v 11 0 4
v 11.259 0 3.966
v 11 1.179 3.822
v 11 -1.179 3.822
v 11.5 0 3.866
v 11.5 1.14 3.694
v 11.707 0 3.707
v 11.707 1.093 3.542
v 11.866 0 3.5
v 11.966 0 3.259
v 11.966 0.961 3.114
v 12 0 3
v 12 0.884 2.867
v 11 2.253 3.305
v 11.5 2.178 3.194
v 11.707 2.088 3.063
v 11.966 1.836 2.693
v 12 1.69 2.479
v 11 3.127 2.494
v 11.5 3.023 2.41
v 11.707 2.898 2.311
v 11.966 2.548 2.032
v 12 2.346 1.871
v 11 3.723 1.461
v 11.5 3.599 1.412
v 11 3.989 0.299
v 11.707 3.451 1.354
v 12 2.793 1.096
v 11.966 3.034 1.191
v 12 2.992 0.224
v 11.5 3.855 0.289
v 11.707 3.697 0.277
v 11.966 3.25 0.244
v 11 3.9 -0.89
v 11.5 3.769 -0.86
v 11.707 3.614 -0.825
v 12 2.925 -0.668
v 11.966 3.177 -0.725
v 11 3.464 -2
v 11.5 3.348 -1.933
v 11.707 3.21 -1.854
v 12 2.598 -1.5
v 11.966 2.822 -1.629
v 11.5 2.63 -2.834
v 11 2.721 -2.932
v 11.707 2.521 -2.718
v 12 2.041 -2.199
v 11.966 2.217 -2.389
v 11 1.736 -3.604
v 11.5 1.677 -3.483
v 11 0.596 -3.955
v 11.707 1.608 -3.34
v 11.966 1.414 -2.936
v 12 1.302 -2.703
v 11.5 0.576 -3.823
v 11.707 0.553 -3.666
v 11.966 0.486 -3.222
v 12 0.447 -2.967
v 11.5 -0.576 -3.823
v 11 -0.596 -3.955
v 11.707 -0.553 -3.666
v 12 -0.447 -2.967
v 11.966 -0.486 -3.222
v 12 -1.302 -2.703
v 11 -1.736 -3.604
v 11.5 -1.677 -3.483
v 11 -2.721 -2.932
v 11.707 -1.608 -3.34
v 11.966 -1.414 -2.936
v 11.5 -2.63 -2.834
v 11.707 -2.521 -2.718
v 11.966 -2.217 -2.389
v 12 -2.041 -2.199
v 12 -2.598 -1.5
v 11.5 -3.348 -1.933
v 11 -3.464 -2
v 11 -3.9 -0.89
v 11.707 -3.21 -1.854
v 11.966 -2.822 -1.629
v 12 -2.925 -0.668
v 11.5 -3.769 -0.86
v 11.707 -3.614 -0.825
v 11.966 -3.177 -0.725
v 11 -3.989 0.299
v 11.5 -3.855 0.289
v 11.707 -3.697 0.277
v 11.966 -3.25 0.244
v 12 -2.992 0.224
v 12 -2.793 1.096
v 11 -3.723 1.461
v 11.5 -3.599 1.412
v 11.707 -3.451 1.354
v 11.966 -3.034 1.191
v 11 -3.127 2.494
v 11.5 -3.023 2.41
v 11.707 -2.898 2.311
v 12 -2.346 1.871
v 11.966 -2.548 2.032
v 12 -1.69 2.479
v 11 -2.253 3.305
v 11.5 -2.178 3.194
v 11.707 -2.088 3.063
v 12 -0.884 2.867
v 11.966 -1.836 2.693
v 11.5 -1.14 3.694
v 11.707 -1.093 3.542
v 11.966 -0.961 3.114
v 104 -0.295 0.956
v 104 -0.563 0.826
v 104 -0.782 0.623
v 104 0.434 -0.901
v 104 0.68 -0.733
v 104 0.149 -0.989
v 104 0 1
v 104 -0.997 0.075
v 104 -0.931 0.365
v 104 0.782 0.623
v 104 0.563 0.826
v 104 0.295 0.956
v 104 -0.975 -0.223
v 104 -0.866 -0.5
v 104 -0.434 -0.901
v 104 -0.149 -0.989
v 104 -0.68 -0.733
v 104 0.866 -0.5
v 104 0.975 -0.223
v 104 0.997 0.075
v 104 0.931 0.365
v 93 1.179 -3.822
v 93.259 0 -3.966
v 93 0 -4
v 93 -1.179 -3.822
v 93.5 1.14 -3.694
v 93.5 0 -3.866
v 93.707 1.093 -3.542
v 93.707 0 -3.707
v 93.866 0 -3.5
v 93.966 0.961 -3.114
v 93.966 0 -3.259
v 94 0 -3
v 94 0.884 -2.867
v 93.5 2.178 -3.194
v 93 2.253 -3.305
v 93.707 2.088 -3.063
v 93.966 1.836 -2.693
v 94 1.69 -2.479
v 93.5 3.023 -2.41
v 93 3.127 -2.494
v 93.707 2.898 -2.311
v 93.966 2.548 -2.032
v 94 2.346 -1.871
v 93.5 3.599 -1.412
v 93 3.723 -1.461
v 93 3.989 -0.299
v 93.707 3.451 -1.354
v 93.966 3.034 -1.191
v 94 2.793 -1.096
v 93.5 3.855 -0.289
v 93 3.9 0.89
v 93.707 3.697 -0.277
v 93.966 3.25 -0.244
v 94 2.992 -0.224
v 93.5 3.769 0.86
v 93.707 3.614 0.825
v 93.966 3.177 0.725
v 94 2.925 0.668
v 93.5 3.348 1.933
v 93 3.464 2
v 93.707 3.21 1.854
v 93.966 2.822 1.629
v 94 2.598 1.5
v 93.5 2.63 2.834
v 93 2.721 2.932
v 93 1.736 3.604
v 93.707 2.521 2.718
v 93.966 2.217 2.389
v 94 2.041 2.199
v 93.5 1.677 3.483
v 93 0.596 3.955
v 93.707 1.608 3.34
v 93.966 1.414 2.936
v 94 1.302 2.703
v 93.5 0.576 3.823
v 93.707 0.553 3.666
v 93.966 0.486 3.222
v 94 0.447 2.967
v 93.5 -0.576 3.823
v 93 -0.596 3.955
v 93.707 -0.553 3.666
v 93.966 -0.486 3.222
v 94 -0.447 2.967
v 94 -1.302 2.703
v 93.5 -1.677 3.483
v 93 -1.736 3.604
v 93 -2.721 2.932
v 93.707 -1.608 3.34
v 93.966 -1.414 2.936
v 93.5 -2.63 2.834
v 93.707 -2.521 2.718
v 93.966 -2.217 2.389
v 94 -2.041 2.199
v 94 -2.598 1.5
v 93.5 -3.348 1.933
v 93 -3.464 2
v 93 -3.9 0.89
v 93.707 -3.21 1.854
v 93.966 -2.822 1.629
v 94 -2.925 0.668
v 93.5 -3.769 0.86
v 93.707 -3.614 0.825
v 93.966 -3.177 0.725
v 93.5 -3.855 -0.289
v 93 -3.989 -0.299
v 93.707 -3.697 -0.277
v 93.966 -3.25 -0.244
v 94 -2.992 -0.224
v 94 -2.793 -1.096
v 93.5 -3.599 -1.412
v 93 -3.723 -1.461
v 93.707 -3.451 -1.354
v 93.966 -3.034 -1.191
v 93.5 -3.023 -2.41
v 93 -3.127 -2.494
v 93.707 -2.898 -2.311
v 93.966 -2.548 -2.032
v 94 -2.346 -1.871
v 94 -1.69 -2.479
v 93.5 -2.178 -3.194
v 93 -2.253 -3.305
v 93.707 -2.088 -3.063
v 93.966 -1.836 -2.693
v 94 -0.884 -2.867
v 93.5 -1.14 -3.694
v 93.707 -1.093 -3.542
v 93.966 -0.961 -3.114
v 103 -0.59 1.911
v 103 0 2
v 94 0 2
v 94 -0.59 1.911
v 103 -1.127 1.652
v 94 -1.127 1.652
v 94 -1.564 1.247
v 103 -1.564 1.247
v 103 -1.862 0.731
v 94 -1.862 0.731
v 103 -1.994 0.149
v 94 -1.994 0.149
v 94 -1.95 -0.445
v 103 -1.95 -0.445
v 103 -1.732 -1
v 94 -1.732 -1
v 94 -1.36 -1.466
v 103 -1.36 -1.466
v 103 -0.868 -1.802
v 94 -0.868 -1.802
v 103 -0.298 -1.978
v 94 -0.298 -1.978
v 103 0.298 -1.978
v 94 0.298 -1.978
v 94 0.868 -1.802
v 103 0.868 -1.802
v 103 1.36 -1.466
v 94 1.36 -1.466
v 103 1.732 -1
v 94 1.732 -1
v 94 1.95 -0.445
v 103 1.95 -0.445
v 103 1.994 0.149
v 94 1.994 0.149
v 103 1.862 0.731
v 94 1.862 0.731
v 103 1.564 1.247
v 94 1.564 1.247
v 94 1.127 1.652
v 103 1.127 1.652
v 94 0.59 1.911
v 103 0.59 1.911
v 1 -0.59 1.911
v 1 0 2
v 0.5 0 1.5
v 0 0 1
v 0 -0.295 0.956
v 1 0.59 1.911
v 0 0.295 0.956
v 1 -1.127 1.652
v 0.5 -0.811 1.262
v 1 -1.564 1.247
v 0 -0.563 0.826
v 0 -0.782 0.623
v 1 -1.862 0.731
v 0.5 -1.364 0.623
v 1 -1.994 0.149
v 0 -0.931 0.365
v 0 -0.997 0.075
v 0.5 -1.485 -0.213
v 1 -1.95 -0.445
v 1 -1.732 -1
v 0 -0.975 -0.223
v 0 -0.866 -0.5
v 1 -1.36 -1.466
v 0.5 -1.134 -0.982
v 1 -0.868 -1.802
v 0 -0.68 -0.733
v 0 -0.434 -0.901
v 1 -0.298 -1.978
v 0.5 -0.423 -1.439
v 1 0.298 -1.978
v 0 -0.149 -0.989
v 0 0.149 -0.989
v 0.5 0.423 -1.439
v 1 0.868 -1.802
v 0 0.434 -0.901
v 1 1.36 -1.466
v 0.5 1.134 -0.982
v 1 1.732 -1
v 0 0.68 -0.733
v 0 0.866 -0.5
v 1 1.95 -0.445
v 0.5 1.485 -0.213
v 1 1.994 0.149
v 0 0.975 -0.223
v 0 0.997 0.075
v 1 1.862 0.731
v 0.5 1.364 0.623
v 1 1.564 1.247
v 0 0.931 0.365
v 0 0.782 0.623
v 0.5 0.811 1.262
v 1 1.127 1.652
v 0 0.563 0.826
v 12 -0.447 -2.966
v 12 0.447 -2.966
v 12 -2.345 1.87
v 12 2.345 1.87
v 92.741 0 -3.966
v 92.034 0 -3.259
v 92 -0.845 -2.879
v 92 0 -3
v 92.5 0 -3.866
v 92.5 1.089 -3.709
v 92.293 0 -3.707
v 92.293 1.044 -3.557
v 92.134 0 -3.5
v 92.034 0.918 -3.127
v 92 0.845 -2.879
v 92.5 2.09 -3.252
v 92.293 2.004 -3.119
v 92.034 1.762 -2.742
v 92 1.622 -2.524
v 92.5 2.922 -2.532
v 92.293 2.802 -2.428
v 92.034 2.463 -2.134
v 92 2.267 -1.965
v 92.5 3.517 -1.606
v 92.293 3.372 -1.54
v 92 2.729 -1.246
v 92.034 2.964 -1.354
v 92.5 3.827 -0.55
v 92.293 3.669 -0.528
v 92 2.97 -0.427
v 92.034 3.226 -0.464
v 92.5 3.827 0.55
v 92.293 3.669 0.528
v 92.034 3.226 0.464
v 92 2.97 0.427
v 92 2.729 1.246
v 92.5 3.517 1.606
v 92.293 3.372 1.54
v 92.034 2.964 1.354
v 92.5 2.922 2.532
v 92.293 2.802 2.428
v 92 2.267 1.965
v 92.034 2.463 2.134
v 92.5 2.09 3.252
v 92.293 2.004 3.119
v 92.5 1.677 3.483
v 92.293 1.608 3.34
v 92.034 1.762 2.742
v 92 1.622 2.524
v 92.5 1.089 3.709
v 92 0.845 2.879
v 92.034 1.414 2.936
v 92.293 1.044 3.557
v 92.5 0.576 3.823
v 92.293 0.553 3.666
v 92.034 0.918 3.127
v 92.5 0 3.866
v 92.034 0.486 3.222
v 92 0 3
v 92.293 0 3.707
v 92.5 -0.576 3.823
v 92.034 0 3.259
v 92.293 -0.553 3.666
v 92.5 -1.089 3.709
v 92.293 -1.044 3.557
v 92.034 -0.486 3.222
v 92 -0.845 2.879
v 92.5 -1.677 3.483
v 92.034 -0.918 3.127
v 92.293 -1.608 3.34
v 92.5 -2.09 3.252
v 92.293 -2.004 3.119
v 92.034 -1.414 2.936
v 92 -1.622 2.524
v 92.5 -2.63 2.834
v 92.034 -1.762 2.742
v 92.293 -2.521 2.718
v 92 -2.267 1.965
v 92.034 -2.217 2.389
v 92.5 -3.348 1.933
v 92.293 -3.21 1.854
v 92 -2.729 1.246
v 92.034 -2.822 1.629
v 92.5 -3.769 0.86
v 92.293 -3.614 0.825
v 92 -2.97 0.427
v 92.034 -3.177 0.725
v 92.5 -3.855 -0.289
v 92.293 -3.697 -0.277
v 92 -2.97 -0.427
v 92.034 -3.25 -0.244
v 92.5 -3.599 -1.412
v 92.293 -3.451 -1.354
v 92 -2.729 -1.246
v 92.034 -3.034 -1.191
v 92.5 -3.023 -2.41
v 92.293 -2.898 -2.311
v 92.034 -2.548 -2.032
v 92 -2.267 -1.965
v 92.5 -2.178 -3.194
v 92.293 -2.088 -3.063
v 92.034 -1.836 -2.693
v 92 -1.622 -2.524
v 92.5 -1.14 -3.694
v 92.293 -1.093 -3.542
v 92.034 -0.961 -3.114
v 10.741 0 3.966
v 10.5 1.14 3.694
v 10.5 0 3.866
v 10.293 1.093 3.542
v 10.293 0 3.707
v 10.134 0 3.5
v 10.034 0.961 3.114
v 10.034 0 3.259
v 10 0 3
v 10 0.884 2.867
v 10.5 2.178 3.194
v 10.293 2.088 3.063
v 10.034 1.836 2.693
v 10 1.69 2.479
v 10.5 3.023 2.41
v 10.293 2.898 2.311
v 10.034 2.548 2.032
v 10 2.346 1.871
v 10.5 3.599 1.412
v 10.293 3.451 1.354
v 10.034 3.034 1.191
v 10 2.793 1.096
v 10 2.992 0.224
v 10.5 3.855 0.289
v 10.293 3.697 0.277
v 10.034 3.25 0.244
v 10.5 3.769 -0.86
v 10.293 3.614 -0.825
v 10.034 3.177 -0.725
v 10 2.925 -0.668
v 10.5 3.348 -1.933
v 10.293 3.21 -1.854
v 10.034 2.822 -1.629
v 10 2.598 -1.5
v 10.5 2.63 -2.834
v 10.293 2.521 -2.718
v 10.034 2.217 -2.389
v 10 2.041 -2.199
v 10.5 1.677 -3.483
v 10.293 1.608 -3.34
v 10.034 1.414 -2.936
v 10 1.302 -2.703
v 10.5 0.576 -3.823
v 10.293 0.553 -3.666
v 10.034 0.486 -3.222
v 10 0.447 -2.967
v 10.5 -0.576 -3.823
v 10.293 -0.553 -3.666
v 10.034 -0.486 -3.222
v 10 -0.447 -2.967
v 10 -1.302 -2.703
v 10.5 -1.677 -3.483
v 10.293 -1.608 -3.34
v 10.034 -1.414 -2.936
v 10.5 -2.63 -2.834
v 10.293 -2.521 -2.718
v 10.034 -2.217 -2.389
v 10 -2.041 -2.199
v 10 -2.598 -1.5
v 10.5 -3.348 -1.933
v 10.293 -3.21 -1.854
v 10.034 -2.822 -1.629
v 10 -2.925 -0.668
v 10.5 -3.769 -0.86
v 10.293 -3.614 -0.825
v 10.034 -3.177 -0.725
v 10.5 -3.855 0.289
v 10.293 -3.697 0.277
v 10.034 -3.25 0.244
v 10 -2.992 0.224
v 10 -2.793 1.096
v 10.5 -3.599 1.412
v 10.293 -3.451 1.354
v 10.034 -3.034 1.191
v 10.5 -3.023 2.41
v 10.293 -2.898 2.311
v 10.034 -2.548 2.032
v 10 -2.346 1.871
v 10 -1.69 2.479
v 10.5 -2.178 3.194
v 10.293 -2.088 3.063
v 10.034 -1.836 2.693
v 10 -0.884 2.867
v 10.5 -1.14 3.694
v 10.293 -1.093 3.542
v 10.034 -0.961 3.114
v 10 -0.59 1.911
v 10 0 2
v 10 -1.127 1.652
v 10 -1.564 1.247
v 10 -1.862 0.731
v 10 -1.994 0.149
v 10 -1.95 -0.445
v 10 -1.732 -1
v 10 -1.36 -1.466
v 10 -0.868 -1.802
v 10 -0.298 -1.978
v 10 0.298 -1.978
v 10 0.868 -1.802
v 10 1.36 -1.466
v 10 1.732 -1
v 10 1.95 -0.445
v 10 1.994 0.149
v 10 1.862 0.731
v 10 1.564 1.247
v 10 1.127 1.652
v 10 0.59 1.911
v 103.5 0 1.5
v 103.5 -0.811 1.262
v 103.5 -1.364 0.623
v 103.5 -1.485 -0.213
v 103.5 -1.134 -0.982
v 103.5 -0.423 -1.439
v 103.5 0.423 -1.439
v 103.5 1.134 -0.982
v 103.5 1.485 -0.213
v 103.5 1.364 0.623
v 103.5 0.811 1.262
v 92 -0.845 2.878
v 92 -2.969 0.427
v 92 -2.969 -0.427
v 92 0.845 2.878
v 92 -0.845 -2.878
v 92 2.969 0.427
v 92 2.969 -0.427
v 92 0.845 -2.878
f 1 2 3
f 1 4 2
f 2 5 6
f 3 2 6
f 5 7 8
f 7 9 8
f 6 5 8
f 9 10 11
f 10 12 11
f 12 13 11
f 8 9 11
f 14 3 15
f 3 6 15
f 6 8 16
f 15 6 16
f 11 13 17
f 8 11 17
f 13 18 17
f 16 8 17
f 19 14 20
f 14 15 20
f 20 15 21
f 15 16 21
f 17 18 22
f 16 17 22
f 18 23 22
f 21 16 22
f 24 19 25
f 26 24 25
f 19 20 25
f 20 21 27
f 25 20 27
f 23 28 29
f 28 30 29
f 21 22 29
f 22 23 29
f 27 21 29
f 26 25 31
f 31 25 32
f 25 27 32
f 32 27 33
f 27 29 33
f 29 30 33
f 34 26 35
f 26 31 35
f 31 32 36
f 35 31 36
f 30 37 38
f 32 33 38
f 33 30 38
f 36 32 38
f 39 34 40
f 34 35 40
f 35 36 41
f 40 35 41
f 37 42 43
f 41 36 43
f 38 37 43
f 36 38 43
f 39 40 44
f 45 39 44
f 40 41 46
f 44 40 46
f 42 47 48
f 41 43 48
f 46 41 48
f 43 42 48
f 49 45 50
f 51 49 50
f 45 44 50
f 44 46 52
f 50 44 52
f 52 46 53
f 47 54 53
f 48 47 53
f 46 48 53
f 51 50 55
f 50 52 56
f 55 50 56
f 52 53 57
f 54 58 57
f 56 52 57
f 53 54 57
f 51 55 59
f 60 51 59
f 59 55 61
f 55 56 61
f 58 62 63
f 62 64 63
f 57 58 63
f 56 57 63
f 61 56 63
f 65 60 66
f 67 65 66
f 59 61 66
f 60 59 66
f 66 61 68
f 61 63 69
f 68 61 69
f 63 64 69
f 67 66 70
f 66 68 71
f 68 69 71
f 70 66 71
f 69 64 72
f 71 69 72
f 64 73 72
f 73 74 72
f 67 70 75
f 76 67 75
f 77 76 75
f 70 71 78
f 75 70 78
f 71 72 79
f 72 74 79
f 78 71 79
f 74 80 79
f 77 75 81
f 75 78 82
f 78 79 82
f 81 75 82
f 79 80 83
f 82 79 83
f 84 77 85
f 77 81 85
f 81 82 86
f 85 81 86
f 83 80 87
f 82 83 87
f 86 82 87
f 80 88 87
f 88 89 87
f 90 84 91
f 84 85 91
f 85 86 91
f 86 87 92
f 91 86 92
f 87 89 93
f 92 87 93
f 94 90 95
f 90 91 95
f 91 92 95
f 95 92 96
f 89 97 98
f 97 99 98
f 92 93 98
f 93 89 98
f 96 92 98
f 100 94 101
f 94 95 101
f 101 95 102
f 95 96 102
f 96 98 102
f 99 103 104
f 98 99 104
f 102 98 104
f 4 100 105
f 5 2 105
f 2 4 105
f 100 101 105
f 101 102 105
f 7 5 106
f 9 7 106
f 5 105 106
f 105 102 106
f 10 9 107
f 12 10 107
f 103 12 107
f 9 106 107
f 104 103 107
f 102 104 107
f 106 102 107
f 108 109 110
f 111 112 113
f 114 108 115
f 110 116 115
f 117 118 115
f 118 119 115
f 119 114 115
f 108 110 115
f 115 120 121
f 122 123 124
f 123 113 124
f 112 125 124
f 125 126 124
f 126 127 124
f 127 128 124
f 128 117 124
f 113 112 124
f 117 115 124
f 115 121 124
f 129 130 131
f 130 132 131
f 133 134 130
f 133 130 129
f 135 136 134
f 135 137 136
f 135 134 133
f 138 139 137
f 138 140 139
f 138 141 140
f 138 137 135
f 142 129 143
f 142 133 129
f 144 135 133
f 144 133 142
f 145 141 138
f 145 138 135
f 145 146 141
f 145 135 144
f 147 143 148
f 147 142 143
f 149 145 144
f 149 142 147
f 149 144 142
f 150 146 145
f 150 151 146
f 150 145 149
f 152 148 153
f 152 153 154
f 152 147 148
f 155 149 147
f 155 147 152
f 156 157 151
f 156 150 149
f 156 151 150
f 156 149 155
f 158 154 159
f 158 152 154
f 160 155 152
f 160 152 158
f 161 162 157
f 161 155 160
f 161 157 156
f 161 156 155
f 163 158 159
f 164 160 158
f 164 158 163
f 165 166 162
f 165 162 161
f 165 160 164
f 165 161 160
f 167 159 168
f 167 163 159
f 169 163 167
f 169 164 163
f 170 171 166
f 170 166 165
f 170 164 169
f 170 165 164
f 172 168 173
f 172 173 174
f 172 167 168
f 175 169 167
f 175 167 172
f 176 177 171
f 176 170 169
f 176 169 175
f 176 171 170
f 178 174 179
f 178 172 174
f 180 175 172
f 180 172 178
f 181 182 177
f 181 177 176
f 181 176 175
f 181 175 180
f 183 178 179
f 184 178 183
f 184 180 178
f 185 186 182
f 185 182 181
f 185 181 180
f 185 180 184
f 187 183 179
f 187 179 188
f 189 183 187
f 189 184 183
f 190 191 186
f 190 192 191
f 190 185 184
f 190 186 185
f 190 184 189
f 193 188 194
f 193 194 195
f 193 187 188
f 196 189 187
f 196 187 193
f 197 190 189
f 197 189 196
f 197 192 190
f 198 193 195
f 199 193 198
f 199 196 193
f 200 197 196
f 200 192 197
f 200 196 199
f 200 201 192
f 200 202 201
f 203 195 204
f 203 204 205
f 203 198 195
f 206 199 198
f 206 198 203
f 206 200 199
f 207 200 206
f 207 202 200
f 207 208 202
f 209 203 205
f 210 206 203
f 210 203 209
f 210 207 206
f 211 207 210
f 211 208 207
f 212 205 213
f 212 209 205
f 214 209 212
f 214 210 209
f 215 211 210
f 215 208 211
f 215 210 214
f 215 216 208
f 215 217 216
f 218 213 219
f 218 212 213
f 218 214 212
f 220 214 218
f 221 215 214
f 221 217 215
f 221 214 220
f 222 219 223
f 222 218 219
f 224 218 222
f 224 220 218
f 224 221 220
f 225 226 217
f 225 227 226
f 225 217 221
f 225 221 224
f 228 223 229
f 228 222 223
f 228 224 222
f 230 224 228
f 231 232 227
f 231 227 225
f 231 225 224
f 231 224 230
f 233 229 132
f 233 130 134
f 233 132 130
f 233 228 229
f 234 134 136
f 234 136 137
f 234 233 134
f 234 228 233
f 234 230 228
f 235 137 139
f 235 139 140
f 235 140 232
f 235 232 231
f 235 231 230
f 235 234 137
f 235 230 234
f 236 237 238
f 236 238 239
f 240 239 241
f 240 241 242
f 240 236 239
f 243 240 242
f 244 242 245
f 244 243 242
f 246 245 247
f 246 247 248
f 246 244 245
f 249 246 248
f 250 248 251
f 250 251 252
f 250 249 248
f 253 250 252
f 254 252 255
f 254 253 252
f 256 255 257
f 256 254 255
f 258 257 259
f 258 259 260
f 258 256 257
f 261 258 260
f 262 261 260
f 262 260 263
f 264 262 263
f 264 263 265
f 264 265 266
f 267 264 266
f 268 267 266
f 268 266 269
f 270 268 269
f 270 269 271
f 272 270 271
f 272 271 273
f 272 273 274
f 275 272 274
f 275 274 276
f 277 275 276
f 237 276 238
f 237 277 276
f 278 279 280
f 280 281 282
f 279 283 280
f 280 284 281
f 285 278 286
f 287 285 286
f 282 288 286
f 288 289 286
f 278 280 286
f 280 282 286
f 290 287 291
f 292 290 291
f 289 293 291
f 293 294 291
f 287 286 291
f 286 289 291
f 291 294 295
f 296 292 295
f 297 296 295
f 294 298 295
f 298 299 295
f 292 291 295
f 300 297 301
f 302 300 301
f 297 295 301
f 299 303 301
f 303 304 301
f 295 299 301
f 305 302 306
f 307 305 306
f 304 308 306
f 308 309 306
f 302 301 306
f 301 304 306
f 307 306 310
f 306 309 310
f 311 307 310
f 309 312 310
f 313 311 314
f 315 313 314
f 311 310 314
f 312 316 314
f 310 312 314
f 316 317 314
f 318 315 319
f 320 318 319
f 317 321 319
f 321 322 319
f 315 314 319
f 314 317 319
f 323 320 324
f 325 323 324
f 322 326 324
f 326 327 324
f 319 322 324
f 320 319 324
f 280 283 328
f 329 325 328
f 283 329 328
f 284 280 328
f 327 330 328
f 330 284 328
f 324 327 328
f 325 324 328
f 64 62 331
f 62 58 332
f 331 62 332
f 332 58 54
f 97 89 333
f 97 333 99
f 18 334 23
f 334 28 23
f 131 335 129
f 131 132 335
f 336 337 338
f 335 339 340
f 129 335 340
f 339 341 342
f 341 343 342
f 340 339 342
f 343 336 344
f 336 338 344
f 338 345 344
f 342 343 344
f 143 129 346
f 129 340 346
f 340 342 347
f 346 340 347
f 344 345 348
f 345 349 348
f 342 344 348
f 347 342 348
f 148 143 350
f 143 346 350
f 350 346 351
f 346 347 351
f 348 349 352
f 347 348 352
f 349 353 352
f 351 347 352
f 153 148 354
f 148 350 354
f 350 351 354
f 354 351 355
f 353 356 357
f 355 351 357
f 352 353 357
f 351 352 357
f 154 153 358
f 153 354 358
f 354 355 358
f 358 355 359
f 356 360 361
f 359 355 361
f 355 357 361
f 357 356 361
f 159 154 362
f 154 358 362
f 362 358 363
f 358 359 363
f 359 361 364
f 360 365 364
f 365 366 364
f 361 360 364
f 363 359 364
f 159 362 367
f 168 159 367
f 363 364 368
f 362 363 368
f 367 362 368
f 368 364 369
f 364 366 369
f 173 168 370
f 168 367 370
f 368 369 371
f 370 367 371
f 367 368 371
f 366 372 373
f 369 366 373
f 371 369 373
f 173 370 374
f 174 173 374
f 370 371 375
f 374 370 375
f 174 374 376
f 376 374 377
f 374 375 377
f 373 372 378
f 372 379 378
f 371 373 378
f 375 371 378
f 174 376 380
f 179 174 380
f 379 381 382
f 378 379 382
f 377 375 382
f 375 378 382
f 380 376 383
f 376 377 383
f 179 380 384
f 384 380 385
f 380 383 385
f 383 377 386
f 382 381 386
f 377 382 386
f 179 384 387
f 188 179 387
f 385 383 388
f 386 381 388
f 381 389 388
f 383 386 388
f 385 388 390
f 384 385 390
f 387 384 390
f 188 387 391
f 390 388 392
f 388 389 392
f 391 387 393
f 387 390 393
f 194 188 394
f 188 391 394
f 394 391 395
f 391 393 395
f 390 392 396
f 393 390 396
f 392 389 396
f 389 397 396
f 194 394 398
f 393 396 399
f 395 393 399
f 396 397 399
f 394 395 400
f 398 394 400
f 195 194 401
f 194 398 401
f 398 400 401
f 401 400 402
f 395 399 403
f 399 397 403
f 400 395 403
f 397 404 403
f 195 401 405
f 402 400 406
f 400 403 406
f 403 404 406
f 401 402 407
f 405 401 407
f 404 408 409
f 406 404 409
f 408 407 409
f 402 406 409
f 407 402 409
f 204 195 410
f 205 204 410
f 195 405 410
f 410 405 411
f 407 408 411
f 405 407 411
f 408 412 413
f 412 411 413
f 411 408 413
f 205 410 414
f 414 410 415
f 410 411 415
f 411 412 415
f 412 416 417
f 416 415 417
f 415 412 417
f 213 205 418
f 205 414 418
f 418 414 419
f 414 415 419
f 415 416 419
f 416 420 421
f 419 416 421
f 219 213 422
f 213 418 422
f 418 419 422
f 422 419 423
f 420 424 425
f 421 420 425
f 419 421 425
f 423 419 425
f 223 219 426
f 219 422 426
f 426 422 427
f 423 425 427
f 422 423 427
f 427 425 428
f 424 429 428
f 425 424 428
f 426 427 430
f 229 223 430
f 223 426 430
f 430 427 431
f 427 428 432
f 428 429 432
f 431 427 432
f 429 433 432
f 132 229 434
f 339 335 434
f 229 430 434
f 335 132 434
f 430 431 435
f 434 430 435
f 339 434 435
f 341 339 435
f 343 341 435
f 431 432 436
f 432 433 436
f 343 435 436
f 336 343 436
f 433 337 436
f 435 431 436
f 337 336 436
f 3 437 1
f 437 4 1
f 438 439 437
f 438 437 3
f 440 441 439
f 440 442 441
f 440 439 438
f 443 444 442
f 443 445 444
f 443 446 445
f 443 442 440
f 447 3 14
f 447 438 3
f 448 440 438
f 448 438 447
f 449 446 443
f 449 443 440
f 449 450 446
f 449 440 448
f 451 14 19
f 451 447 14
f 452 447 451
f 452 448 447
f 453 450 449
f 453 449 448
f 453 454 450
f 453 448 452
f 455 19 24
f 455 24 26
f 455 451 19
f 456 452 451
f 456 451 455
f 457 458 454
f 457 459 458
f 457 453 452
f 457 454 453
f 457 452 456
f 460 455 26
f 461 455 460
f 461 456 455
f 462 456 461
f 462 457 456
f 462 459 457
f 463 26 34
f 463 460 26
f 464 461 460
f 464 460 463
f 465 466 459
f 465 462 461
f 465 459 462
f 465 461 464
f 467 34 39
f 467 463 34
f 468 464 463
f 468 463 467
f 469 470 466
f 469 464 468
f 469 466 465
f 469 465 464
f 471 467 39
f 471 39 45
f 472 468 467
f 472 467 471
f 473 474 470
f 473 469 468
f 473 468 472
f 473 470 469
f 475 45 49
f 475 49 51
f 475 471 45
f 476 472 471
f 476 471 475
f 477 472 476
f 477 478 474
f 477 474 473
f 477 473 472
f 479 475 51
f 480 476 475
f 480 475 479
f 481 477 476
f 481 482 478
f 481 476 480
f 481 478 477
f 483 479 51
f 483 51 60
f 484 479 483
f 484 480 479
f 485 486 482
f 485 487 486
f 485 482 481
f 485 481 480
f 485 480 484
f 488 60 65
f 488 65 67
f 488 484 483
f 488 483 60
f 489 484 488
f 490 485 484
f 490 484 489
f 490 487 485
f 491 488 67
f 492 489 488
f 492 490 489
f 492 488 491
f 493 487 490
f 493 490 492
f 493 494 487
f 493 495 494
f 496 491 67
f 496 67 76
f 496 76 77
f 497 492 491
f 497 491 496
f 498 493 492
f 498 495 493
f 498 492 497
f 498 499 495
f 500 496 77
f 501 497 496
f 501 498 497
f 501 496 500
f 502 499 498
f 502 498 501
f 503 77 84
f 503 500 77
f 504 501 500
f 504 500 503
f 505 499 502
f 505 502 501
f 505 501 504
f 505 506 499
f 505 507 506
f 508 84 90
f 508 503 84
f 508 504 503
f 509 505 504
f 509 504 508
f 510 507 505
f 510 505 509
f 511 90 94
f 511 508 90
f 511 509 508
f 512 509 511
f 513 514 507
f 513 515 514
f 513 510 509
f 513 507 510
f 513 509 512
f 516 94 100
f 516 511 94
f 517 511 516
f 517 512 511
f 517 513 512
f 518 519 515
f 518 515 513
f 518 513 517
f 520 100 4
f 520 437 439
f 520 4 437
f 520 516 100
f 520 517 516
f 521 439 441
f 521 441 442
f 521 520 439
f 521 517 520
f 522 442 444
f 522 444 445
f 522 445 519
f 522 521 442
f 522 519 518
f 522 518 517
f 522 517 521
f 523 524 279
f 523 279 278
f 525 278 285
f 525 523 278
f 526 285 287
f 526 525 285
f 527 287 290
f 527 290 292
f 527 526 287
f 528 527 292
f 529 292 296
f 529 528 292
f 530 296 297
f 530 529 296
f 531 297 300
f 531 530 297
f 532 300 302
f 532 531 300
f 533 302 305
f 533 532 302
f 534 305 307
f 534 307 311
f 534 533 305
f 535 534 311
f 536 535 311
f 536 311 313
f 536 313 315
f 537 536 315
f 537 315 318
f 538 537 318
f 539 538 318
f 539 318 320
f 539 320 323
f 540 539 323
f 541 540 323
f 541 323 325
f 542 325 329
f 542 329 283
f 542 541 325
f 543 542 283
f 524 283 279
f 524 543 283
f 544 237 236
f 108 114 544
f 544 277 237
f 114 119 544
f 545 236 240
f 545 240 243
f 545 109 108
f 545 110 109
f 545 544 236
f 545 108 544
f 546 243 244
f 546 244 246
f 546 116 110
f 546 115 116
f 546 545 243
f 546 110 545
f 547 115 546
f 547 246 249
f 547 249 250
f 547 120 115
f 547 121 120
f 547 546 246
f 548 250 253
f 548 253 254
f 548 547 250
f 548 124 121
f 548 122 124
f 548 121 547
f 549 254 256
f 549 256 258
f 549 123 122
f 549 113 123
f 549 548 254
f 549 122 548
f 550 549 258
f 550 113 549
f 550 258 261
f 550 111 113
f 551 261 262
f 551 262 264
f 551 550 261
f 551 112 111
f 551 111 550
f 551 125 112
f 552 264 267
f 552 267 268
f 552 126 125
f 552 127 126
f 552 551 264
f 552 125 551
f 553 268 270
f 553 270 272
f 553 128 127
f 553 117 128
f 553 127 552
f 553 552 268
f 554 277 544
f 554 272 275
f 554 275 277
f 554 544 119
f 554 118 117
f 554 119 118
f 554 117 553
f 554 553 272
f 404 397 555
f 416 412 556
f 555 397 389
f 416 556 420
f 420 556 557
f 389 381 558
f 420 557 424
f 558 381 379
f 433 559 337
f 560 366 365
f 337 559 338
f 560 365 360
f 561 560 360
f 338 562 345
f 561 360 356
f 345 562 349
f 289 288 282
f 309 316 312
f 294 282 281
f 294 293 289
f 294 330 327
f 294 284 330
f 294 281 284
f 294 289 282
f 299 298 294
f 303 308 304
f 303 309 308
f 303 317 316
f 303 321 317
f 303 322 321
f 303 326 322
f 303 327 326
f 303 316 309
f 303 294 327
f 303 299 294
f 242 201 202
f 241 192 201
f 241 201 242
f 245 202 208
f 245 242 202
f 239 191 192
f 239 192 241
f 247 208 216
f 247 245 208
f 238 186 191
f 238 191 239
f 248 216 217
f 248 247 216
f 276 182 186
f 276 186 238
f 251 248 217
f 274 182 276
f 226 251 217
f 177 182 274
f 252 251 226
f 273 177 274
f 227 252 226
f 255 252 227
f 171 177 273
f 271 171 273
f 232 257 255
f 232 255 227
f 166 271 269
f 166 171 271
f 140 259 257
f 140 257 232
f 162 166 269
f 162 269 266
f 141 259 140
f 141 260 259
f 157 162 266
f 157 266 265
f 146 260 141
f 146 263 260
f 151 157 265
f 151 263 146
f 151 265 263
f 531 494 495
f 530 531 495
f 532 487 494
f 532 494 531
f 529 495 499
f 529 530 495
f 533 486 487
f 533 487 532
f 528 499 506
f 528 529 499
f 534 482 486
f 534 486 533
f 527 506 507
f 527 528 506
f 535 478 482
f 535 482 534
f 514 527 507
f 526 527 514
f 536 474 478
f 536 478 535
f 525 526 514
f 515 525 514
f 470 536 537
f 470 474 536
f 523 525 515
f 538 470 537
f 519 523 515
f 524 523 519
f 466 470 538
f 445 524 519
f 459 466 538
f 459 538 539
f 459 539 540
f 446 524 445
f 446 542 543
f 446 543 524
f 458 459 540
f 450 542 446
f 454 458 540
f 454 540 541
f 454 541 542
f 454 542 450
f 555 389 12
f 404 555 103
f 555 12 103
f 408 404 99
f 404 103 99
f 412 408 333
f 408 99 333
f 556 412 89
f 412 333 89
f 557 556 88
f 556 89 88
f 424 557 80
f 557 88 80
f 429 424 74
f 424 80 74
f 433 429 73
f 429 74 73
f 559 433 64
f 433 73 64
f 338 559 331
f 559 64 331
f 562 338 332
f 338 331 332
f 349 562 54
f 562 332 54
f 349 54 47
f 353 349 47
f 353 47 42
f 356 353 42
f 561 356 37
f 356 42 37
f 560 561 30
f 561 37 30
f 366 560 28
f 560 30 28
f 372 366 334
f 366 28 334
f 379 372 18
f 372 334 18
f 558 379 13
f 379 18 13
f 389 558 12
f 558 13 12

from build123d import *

# Parameters (mm, degrees)
SKETCH2_W           = 10
SKETCH2_H           = 2
SKETCH3_R           = 4
BOSS_EXTRUDE1_DEPTH = 2
FILLET1_R           = 1
CHAMFER1_SIZE       = 1
CHAMFER2_SIZE       = 1
BOSS_EXTRUDE2_START = -2
SKETCH4_R           = 4
BOSS_EXTRUDE2_DEPTH = 2
FILLET2_R           = 1


with BuildPart() as part:
    # Sketch2 → Revolve2 (revolve)
    with BuildSketch(Plane.XY, mode=Mode.PRIVATE) as revolve2_sk:
        with Locations((99, 1)):
            Rectangle(SKETCH2_W, SKETCH2_H)
        Polygon((10, 2), (10, 0), (94, 0), (94, 2), (94, 3), (10, 3), align=None)
        with Locations((5, 1)):
            Rectangle(SKETCH2_W, SKETCH2_H)
    revolve(revolve2_sk.sketch.rotate(Axis((0, 0, 0), (1, 0, 0)), 90), axis=Axis((0, 0, 0), (1, 0, 0)))

    # Sketch3 → Boss-Extrude1 (add)
    with BuildSketch(Plane(origin=(94, 0, 0), x_dir=(0, 0, -1), z_dir=(1, 0, 0))):
        Circle(SKETCH3_R)
    extrude(amount=-BOSS_EXTRUDE1_DEPTH)

    # Fillet1
    fillet1_edges = [part.edges().sort_by_distance(p)[0] for p in [
        (92, 0, 4),
        (94, 0, 4),
    ]]
    fillet(fillet1_edges, radius=FILLET1_R - 0.0001)  # a hair under: the kernel refuses the full size

    # Chamfer1
    chamfer1_edges = [part.edges().sort_by_distance(p)[0] for p in [
        (104, 0, -2),
    ]]
    chamfer(chamfer1_edges, length=CHAMFER1_SIZE)

    # Chamfer2
    chamfer2_edges = [part.edges().sort_by_distance(p)[0] for p in [
        (0, 0, -2),
    ]]
    chamfer(chamfer2_edges, length=CHAMFER2_SIZE)

    # Sketch4 → Boss-Extrude2 (add)
    with BuildSketch(Plane.ZY.offset(-10).offset(BOSS_EXTRUDE2_START)):
        Circle(SKETCH4_R)
    extrude(amount=BOSS_EXTRUDE2_DEPTH)

    # Fillet2
    fillet2_edges = [part.edges().sort_by_distance(p)[0] for p in [
        (12, 0, -4),
        (10, 0, -4),
    ]]
    fillet(fillet2_edges, radius=FILLET2_R - 0.0001)  # a hair under: the kernel refuses the full size


solid = part.part
